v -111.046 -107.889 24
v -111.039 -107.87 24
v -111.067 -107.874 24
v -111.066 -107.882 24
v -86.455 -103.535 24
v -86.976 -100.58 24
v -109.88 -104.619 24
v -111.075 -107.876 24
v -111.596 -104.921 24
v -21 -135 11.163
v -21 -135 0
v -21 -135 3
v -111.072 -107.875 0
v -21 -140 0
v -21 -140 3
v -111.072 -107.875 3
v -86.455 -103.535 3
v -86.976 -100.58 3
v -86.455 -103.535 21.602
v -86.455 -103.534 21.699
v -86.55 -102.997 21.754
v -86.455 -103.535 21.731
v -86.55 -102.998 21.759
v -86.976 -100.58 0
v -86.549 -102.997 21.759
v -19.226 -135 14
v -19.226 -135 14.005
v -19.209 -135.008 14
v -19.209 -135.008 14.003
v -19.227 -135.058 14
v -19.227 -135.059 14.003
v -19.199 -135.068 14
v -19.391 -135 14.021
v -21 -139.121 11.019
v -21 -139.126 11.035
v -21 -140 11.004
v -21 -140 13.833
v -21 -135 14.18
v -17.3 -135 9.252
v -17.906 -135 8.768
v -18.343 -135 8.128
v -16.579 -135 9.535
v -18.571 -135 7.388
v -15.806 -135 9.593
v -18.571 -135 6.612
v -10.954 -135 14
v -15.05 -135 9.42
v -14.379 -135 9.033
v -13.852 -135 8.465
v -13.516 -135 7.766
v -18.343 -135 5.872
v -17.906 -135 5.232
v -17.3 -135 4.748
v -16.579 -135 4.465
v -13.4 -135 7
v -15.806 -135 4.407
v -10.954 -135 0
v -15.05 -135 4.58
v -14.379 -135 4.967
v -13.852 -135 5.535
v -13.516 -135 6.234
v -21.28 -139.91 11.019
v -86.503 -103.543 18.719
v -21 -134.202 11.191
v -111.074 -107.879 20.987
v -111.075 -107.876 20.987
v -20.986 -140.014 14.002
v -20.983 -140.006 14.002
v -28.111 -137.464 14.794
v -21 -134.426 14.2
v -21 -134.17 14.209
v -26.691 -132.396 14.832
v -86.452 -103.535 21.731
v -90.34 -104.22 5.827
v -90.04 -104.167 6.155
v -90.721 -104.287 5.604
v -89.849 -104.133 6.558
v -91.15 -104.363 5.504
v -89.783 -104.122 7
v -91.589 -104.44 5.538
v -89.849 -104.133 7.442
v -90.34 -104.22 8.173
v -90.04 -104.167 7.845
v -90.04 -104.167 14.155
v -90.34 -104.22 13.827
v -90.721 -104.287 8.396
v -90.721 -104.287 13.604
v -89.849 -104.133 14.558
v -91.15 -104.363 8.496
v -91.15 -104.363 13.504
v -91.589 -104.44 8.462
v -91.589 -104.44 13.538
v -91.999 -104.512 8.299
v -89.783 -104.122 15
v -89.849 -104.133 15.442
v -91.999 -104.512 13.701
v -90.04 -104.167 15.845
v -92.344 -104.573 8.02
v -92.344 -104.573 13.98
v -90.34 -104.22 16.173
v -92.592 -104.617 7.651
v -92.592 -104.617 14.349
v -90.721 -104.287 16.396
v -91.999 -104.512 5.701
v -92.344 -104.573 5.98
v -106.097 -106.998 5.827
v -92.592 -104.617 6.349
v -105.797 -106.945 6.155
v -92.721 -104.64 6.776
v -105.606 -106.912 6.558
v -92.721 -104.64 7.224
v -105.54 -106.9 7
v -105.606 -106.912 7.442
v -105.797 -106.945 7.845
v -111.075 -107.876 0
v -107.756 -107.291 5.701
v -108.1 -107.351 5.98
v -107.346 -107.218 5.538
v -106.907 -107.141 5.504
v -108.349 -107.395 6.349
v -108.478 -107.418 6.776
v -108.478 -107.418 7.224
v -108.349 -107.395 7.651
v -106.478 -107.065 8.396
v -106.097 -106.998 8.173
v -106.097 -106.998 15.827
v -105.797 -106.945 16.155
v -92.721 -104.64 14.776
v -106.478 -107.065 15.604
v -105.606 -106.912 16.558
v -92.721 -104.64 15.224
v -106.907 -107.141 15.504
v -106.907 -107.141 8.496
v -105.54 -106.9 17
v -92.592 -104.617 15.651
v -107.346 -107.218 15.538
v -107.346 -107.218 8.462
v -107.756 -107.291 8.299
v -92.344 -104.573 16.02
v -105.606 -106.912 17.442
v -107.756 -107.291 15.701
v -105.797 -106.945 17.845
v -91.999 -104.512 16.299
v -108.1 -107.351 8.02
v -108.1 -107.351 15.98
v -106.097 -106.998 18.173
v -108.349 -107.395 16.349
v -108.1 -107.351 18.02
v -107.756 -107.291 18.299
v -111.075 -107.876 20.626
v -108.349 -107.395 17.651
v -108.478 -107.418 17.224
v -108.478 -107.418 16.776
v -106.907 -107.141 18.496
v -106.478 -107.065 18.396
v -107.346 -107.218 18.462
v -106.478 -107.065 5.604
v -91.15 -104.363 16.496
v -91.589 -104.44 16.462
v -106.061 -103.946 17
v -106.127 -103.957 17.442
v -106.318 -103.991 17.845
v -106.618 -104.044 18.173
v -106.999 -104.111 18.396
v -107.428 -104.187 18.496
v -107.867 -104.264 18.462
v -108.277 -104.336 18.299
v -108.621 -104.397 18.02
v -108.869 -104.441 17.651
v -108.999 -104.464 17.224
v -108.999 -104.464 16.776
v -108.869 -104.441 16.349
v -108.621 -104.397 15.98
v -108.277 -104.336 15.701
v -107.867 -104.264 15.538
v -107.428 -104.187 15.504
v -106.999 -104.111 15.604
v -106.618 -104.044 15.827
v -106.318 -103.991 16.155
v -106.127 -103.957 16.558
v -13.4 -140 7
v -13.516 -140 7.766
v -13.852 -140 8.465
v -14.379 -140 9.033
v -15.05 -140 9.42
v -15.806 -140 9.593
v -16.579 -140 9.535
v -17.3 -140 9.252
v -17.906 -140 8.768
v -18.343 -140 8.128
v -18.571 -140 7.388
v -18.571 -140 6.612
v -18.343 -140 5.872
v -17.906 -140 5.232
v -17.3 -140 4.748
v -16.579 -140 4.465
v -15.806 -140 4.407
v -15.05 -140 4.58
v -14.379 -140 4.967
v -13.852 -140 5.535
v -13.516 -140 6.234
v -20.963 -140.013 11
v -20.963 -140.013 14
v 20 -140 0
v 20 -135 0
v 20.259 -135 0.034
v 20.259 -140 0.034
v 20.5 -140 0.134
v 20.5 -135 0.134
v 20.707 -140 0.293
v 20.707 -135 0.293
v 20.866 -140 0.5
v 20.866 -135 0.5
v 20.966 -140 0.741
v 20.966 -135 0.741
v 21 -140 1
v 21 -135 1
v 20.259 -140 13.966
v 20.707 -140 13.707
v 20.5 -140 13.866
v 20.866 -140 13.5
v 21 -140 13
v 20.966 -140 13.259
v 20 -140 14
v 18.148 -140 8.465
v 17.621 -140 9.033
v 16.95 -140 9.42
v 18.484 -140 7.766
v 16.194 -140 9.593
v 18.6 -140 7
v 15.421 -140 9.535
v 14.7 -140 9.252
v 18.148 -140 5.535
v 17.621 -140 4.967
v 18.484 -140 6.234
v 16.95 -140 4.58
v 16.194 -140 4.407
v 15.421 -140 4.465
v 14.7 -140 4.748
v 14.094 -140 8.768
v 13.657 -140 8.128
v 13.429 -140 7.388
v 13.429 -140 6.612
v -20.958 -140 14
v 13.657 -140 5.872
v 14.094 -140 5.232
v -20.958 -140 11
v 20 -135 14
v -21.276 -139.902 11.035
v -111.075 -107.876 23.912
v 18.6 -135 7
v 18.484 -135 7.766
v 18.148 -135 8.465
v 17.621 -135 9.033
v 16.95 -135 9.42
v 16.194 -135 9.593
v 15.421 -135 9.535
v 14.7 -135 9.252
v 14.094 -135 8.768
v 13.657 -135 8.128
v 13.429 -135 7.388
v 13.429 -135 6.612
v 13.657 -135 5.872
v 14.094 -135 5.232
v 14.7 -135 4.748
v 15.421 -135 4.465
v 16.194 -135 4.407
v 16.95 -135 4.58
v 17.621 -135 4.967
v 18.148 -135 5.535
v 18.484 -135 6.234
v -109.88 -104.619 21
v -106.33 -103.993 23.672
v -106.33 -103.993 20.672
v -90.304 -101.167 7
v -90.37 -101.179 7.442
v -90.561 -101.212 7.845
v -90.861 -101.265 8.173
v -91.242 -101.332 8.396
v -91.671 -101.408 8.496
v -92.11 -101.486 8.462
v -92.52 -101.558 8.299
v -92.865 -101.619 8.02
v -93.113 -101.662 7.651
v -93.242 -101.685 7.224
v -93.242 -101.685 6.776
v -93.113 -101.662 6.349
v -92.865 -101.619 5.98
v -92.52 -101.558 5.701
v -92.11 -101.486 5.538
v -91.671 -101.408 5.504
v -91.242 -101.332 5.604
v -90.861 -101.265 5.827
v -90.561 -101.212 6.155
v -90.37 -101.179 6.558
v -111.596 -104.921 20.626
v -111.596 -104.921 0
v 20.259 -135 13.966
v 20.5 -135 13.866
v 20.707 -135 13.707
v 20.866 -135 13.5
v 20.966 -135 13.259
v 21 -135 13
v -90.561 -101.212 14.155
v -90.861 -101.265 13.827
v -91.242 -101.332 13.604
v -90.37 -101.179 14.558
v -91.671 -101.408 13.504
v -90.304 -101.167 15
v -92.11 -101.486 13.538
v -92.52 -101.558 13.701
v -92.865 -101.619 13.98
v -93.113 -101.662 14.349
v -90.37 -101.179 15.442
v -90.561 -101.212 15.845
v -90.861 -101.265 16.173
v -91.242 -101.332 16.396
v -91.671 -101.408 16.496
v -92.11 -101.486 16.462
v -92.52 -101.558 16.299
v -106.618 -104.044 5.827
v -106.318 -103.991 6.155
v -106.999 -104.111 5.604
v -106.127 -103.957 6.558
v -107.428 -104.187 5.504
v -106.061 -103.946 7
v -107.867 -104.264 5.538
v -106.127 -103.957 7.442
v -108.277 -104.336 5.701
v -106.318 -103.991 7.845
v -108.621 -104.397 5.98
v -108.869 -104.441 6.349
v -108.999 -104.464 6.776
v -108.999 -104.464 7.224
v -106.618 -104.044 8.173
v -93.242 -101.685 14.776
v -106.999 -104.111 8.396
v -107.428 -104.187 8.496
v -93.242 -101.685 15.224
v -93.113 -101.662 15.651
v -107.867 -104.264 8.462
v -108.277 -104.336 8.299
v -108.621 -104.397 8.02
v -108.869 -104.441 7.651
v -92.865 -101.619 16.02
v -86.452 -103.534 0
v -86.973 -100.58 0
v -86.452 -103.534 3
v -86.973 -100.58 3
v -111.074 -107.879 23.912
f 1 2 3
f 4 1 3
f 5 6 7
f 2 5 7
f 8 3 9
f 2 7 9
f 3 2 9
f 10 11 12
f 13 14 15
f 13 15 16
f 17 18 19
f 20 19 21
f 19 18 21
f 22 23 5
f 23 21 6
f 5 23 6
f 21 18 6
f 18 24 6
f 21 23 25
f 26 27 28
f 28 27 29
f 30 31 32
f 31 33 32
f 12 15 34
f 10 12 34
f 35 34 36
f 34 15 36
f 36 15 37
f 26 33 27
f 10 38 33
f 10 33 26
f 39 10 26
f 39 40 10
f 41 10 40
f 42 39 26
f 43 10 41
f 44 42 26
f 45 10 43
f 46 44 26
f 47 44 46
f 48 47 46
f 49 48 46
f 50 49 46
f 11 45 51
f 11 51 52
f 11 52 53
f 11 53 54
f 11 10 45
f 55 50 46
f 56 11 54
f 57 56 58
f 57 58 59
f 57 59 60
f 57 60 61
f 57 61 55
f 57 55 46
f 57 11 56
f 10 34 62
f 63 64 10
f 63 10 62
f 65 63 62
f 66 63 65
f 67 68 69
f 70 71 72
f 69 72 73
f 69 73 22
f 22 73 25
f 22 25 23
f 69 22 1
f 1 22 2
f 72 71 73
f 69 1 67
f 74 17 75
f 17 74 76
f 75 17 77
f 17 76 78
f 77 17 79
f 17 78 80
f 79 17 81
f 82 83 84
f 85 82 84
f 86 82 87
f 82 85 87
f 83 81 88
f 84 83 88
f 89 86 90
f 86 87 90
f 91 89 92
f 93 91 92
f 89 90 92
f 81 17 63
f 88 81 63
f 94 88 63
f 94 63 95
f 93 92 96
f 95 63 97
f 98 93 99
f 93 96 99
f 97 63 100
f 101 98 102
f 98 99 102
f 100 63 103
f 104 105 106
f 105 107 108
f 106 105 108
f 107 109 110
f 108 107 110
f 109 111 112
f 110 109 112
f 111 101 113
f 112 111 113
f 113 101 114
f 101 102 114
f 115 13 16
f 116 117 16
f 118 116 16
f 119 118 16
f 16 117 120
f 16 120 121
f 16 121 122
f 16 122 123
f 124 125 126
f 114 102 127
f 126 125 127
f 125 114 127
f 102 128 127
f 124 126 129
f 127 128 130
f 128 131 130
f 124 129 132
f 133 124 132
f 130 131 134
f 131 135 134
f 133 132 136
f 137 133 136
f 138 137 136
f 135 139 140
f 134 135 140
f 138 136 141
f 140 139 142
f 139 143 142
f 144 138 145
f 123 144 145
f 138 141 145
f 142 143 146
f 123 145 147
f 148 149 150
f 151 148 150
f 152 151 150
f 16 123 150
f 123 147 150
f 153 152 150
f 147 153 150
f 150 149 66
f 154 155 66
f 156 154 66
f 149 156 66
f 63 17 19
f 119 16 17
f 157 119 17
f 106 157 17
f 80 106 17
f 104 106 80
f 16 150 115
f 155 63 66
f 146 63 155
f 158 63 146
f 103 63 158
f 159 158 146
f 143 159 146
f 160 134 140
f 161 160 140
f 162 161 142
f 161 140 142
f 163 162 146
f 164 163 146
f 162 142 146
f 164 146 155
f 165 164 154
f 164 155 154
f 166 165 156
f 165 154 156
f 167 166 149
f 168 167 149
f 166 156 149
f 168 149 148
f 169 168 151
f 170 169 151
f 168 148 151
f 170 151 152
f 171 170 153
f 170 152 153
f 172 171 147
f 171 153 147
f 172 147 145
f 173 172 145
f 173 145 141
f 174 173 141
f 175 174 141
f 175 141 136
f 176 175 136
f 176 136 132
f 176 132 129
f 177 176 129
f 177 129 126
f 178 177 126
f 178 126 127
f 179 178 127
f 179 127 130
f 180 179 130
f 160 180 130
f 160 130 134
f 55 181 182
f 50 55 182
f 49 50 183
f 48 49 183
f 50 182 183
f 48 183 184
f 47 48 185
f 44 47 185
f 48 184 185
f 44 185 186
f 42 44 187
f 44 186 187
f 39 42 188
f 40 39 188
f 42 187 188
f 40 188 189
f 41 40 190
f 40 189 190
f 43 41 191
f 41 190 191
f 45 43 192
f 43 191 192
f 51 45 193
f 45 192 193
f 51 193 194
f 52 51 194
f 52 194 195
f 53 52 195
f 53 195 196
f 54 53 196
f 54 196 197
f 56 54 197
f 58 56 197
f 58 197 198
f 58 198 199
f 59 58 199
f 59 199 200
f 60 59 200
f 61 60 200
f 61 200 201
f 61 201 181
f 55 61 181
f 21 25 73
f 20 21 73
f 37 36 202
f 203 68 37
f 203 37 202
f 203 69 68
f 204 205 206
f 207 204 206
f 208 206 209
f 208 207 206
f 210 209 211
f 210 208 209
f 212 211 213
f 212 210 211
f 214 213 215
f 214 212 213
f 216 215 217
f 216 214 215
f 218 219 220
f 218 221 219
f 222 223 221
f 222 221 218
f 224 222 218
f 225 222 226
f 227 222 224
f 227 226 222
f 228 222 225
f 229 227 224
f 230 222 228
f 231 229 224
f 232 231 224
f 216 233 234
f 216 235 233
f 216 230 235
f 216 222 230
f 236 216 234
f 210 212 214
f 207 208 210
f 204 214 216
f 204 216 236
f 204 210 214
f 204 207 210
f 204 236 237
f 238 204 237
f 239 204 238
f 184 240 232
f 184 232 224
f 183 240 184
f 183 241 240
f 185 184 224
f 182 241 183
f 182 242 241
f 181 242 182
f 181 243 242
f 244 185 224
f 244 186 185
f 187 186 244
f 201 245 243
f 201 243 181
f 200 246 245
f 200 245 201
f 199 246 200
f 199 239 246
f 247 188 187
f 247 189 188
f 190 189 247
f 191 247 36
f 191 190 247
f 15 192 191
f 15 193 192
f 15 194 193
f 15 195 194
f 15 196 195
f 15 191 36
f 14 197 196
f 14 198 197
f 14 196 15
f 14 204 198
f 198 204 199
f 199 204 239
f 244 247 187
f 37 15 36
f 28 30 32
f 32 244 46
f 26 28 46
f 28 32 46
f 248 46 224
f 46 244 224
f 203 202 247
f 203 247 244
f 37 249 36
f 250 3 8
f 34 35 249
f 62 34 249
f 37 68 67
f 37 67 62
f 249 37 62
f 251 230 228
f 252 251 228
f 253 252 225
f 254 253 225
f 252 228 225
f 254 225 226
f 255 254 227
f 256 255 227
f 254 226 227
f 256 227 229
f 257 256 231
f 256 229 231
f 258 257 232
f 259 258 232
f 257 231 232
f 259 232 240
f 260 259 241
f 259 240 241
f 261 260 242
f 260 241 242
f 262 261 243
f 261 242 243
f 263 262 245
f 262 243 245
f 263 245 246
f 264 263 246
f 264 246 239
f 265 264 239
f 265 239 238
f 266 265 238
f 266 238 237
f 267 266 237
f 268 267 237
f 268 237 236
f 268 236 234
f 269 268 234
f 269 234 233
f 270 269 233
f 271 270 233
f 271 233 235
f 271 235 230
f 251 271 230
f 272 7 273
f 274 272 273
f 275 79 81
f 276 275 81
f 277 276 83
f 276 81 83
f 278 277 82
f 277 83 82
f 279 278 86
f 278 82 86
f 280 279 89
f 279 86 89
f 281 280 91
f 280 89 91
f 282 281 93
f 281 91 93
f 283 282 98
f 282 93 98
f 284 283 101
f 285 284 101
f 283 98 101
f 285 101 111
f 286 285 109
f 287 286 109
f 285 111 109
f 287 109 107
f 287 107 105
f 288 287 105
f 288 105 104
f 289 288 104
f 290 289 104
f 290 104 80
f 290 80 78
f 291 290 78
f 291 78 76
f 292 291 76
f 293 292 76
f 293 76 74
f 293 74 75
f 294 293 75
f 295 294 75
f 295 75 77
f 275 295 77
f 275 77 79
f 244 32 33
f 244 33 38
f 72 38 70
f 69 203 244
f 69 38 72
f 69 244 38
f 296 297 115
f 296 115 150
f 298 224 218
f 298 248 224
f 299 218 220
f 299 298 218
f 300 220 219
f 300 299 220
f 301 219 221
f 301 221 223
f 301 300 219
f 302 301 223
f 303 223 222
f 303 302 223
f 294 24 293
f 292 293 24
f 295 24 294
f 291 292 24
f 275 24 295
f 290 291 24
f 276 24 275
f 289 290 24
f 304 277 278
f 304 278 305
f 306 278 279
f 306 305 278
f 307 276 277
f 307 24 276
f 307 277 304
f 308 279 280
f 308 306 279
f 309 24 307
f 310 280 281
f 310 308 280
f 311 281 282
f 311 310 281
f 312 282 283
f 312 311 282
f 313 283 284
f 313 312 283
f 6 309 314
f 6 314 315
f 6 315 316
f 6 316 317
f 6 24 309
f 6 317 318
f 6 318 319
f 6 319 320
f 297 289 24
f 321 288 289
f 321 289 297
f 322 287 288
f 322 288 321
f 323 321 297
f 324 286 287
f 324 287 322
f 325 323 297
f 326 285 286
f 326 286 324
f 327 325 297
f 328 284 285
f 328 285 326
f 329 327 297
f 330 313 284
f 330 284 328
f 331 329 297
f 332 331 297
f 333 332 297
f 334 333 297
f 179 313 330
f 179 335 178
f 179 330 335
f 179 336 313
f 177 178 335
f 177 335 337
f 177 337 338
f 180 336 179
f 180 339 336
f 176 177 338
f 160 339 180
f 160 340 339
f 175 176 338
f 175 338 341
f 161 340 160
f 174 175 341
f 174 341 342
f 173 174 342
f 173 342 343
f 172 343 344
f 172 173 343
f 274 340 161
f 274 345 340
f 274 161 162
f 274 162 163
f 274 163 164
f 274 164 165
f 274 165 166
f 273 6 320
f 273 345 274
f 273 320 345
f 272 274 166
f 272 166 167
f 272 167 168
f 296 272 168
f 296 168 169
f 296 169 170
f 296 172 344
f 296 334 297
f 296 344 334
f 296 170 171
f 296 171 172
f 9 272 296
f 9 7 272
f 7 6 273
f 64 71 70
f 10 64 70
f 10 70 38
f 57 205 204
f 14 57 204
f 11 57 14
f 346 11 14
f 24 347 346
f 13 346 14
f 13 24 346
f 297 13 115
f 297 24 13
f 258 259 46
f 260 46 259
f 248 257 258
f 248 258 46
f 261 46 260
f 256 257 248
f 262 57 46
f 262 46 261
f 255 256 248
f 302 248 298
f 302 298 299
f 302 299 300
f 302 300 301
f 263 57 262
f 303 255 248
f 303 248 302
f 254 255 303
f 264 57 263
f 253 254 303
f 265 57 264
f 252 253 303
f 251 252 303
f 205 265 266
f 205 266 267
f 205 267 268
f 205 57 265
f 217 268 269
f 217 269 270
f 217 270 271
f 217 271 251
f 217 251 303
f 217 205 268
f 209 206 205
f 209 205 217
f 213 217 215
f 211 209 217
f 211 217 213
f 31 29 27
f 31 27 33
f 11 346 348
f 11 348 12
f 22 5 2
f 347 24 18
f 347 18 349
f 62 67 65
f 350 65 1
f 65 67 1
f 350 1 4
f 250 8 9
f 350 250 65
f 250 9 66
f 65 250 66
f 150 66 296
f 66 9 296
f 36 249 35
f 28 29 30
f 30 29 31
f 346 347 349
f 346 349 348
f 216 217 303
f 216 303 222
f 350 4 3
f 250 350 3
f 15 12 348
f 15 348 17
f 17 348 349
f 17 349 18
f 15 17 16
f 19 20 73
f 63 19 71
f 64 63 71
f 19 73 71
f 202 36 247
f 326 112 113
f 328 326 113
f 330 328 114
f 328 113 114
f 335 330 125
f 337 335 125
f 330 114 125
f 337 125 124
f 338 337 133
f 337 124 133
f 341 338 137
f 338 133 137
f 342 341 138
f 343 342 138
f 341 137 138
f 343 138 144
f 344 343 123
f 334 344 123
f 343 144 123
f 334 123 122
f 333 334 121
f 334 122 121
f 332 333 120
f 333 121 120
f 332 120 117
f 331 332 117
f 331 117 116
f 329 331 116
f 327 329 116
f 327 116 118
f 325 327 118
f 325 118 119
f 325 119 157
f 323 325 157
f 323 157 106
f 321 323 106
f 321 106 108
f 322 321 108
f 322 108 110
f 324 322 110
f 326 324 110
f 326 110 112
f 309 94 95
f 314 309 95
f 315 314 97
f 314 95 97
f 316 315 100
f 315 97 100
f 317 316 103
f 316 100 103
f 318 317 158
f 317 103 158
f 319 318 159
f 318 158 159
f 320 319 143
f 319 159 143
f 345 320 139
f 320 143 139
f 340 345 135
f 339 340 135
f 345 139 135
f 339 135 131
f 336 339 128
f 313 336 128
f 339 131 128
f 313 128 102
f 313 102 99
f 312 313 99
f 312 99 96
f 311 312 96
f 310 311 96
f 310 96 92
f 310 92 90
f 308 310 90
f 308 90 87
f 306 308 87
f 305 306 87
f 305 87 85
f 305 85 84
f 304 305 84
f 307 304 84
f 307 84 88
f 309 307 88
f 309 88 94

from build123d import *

# Parameters (mm, degrees)
PAD_DEPTH       = 3
SKETCH001_R     = 2.6
POCKET_DEPTH    = 39.421276
SKETCH002_W     = 42
SKETCH002_H     = 14
PAD001_DEPTH    = 5
SKETCH003_W     = 25
SKETCH003_H     = 24
PAD002_DEPTH    = 3
PAD003_DEPTH    = 5.25
PAD004_DEPTH    = 3
SKETCH006_R     = 2.6
POCKET001_DEPTH = 39.421276
SKETCH007_W     = 10.046043
SKETCH007_H     = 6.845245
POCKET002_DEPTH = 24.040304
POCKET003_DEPTH = 24.001
POCKET004_DEPTH = 57.585803
SKETCH009_R     = 1.5
POCKET005_DEPTH = 7.276792
FILLET_R        = 1


with BuildPart() as part:
    # Sketch → Pad (new body)
    with BuildSketch(Plane.XY):
        Polygon((-111.071915, -107.875351), (-111.592859, -104.920928), (-86.972666, -100.579724), (-86.451721, -103.534147), (-21, -135), (21, -135), (21, -140), (-21, -140), align=None)
    extrude(amount=PAD_DEPTH)

    # Sketch001 (on Face7 of Pad) → Pocket (cut, through all)
    with BuildSketch(Plane.XZ.offset(140)):
        with Locations((-11.143028, 7)):
            Circle(SKETCH001_R)
        with Locations((11.143028, 7)):
            Circle(SKETCH001_R)
    extrude(amount=-POCKET_DEPTH, mode=Mode.SUBTRACT)

    # Sketch002 (on Face7 of Pad) → Pad001 (join)
    with BuildSketch(Plane.XZ.offset(140)):
        with Locations((0, 7)):
            Rectangle(SKETCH002_W, SKETCH002_H)
    extrude(amount=-PAD001_DEPTH)

    # Sketch003 (on Face3 of Pad001) → Pad002 (join)
    with BuildSketch(Plane(origin=(14.577599, -82.673672, 0), x_dir=(-0.984808, -0.173648, 0), z_dir=(-0.173648, 0.984808, 0))):
        with Locations((115.62, 12)):
            Rectangle(SKETCH003_W, SKETCH003_H)
    extrude(amount=-PAD002_DEPTH)

    # Sketch004 (on Face14 of Pad002) → Pad003 (join)
    with BuildSketch(Plane(origin=(-46.66687, -130.845768, 0), x_dir=(0.941887, -0.335929, 0), z_dir=(-0.335929, -0.941887, 0))):
        Polygon((27.29, 14), (-68.35, 24), (-68.35, 21), (27.29, 11), align=None)
    extrude(amount=-PAD003_DEPTH)

    # Sketch005 (on Face25 of Pad003) → Pad004 (join)
    with BuildSketch(Plane(origin=(1.641818, -0.585563, 16.671151), x_dir=(0.995191, 0.003438, -0.097888), z_dir=(0.097949, -0.034934, 0.994578))):
        Polygon((-88.519324, -102.708058), (-20.951239, -134.433376), (-22.737431, -139.436564), (-113.251967, -106.97329), (-113.372097, -106.249408), (-88.616976, -102.170205), align=None)
    extrude(amount=-PAD004_DEPTH)

    # Sketch006 (on Face36 of Pad004) → Pocket001 (cut, through all)
    with BuildSketch(Plane.XZ.offset(140)):
        with Locations((-16, 7)):
            Circle(SKETCH006_R)
        with Locations((16, 7)):
            Circle(SKETCH006_R)
    extrude(amount=-POCKET001_DEPTH, mode=Mode.SUBTRACT)

    # Sketch007 (on Face17 of Pocket001) → Pocket002 (cut, through all)
    with BuildSketch(Plane(origin=(0, 0, 0), x_dir=(1, 0, 0), z_dir=(0, 0, -1))):
        with Locations((-15.976978, 131.577378)):
            Rectangle(SKETCH007_W, SKETCH007_H)
    extrude(amount=-POCKET002_DEPTH, mode=Mode.SUBTRACT)

    # Sketch008 (on Face10 of Pocket002) → Pocket003 (cut, through all)
    with BuildSketch(Plane.XY.offset(24)):
        Polygon((-111.59565, -104.921097), (-104.281212, -103.631622), (-103.238319, -101.954292), (-111.59565, -102.358459), align=None)
    extrude(amount=-POCKET003_DEPTH, mode=Mode.SUBTRACT)

    # Sketch010 (on Face4 of Pocket003) → Pocket004 (cut, through all)
    with BuildSketch(Plane(origin=(14.577599, -82.673672, 0), x_dir=(-0.984808, -0.173648, 0), z_dir=(-0.173648, 0.984808, 0))):
        Polygon((127.009121, 24), (128.119995, 24), (128.119995, 20.625757), (128.829539, 20.625757), (128.829539, 24.40741), (126.853241, 24.40741), align=None)
    extrude(amount=-POCKET004_DEPTH, mode=Mode.SUBTRACT)

    # Sketch009 (on Face20 of Pocket003) → Pocket005 (cut, through all)
    with BuildSketch(Plane(origin=(15.098544, -85.628095, 0), x_dir=(0.984808, 0.173648, 0), z_dir=(0.173648, -0.984808, 0))):
        with Locations((-124, 17)):
            Circle(SKETCH009_R)
        with Locations((-108, 15)):
            Circle(SKETCH009_R)
        with Locations((-124, 7)):
            Circle(SKETCH009_R)
        with Locations((-108, 7)):
            Circle(SKETCH009_R)
    extrude(amount=-POCKET005_DEPTH, mode=Mode.SUBTRACT)

    # Fillet
    fillet_edges = [part.edges().sort_by_distance(p)[0] for p in [
        (21, -137.5, 14),
        (21, -137.5, 0),
    ]]
    fillet(fillet_edges, radius=FILLET_R)


solid = part.part
